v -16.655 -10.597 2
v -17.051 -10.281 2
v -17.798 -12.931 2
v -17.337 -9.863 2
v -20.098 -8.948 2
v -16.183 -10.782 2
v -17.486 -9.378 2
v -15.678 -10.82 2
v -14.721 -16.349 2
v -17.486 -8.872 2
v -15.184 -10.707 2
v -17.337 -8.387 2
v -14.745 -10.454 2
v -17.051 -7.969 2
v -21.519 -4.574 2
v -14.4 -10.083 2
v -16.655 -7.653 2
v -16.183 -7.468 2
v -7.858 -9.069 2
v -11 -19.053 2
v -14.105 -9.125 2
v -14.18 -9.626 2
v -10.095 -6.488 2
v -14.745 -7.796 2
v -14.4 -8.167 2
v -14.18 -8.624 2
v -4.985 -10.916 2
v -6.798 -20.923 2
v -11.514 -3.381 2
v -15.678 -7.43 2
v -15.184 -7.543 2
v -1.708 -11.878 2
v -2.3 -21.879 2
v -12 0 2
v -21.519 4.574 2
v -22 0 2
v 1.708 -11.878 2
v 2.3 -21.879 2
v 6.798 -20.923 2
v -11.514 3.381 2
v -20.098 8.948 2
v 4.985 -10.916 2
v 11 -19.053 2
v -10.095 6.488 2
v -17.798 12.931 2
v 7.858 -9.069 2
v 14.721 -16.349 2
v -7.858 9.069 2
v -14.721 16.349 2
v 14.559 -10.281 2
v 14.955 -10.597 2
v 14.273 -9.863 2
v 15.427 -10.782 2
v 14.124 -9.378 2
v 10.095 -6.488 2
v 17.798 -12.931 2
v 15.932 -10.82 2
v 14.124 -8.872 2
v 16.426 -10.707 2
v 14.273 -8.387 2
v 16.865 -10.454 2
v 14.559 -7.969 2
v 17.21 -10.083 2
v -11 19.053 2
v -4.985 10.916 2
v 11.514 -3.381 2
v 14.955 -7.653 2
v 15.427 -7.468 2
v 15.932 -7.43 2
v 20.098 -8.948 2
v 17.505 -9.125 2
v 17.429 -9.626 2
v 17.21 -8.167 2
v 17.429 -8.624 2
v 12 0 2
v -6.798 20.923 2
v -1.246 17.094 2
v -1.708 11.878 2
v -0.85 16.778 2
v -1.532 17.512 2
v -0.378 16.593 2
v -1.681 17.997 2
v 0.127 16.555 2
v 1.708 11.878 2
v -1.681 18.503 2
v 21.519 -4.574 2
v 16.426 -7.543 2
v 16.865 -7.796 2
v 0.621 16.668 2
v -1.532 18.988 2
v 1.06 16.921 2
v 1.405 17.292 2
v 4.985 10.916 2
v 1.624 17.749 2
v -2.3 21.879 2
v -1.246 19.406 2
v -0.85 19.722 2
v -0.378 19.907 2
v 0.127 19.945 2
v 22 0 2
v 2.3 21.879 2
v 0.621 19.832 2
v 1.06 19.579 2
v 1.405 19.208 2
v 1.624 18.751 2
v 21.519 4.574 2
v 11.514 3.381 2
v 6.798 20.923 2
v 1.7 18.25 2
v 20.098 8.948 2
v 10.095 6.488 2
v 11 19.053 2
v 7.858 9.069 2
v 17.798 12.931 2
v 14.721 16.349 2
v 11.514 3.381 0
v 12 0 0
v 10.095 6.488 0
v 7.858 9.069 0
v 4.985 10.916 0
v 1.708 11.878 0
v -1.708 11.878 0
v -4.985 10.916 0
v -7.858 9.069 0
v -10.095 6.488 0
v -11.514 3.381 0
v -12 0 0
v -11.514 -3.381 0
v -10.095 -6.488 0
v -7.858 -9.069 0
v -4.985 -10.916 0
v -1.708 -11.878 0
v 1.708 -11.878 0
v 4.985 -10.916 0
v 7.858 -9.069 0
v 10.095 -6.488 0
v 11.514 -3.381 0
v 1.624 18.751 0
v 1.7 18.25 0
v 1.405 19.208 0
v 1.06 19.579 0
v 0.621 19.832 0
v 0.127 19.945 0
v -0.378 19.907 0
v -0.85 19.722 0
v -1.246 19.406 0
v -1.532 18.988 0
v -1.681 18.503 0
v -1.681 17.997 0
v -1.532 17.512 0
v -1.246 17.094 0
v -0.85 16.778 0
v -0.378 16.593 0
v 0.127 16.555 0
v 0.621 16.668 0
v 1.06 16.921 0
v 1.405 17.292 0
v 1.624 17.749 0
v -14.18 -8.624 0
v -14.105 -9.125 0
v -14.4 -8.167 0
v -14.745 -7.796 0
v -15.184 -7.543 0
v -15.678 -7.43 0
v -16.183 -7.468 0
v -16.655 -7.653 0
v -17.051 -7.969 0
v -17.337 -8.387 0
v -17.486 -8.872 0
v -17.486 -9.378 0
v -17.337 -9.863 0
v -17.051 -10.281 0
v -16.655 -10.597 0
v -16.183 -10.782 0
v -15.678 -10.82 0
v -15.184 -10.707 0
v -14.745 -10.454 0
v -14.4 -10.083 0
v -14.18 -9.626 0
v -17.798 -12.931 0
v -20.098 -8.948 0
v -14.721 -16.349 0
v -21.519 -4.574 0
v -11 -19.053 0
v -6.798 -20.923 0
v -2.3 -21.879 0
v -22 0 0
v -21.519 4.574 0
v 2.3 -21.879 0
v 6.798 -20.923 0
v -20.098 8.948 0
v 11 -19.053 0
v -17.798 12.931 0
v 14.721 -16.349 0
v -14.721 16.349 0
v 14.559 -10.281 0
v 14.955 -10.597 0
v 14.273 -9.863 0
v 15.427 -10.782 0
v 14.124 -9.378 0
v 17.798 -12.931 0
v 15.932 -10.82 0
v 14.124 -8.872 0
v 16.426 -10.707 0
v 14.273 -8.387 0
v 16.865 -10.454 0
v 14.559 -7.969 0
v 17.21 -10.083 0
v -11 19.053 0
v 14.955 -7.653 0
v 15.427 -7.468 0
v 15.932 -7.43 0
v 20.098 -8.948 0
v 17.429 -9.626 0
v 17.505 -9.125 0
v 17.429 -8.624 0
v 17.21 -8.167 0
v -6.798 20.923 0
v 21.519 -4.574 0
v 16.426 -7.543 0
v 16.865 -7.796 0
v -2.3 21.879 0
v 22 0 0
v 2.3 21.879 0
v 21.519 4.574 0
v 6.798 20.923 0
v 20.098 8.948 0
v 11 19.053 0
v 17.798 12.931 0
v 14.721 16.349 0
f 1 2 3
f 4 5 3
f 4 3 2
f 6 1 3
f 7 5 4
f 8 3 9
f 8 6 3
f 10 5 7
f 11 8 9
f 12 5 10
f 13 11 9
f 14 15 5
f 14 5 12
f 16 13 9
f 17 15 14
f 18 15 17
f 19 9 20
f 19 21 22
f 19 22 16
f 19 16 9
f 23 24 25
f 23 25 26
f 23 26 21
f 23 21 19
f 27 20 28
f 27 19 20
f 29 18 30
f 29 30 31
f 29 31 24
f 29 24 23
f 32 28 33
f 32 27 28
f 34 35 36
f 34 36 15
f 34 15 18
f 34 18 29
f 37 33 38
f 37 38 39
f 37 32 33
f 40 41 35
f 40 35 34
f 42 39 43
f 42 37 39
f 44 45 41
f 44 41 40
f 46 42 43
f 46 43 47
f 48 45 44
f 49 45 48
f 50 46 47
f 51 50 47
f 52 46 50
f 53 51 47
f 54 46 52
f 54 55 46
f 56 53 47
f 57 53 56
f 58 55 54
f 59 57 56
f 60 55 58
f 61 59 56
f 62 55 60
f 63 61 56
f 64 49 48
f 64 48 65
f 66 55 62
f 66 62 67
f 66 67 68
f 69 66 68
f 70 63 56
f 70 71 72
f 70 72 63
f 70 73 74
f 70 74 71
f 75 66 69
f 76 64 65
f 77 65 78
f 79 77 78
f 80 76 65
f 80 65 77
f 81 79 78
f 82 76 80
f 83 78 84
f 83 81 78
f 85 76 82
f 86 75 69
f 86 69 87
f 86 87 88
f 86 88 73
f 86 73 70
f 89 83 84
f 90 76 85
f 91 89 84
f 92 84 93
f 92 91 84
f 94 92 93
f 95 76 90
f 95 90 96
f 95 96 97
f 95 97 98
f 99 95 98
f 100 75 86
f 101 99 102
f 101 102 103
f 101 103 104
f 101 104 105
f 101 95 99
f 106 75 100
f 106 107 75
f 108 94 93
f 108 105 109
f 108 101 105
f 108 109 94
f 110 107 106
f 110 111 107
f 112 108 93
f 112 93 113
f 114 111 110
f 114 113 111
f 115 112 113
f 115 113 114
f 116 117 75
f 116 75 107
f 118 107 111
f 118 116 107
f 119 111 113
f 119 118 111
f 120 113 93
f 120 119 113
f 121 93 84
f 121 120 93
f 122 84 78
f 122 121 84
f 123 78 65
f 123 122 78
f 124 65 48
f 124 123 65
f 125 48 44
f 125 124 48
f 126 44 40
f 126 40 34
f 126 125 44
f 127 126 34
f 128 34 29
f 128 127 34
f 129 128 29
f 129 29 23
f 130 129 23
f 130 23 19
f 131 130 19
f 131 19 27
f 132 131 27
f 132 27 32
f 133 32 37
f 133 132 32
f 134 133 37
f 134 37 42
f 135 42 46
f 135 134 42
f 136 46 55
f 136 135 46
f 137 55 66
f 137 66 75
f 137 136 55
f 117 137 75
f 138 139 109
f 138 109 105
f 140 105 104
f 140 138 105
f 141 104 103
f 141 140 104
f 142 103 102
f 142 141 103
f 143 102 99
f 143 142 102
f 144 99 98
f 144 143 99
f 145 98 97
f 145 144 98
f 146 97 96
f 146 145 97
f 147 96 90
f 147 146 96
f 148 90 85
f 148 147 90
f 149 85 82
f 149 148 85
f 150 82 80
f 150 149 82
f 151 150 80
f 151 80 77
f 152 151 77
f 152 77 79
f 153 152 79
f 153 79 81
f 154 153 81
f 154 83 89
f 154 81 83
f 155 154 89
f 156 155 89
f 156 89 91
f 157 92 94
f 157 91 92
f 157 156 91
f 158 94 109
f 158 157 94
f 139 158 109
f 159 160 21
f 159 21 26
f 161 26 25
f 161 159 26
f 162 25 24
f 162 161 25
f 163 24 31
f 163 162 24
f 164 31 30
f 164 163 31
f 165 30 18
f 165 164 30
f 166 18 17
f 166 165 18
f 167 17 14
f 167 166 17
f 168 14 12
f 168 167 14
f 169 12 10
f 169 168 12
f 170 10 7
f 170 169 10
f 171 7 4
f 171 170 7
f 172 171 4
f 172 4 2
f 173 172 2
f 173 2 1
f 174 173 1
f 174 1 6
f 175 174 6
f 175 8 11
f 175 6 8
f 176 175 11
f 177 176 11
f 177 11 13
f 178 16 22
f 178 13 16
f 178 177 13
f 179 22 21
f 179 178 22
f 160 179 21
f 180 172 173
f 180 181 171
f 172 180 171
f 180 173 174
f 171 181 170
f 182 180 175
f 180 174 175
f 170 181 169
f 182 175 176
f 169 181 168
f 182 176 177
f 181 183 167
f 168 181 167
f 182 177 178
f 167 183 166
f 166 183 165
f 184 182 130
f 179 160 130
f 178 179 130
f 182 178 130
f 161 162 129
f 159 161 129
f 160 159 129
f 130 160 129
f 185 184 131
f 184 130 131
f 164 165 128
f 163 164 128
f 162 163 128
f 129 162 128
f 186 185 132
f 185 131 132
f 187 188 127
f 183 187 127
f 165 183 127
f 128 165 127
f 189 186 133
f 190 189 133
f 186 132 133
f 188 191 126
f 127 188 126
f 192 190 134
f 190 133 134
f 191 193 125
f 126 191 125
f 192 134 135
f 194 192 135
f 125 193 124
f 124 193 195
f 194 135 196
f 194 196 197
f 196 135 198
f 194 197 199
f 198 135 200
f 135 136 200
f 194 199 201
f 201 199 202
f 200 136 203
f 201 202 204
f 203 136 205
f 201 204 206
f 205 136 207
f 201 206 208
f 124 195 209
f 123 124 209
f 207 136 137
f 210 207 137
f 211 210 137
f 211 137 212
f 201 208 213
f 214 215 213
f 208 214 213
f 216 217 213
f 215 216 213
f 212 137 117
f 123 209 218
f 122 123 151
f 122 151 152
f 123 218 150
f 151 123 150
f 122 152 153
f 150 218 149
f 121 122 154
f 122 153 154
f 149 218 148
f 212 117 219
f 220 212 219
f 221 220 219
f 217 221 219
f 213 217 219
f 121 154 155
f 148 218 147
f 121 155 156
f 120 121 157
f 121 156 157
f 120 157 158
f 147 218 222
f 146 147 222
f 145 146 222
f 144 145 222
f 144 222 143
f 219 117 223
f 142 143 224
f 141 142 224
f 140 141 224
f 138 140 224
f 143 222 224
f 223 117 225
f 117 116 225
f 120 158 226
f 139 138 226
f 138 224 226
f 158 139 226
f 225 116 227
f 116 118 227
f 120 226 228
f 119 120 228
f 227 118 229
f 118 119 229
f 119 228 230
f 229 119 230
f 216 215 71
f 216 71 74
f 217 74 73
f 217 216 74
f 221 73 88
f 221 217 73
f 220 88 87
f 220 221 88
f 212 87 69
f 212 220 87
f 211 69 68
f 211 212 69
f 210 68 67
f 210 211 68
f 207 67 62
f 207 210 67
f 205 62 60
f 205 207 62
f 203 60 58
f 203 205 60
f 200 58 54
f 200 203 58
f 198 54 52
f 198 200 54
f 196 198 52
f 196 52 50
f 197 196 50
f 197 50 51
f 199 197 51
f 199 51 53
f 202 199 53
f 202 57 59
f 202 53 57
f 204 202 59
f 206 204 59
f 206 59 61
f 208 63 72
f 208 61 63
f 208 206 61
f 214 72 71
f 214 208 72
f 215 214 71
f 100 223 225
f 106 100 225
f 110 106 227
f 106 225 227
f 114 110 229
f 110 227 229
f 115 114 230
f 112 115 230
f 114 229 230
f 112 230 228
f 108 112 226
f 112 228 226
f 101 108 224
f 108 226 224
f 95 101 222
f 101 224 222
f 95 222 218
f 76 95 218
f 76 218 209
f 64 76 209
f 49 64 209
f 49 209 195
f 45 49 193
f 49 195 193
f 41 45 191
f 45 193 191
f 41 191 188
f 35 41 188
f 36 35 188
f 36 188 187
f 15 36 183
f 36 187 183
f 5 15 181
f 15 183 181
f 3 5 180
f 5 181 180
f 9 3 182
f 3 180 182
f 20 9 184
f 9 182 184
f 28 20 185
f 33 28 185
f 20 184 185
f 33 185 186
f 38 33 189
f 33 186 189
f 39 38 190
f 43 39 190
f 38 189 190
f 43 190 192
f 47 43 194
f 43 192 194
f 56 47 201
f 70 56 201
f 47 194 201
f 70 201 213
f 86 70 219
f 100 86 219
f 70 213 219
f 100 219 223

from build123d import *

# Parameters (mm, degrees)
S01_OUTER_RACE_RETAINING_LIP_R          = 22
S01_OUTER_RACE_RETAINING_LIP_R_2        = 12
F_01_OUTER_RACE_RETAINING_LIP_DEPTH     = 2
F_02_START                              = -1
S02_THREE_ACCESSIBLE_SCREW_HOLES_R      = 1.7
F_02_THREE_ACCESSIBLE_SCREW_HOLES_DEPTH = 4


with BuildPart() as part:
    # S01 - Outer race retaining lip → 01 - Outer race retaining lip (new body)
    with BuildSketch(Plane.XY):
        Circle(S01_OUTER_RACE_RETAINING_LIP_R)
        Circle(S01_OUTER_RACE_RETAINING_LIP_R_2, mode=Mode.SUBTRACT)
    extrude(amount=F_01_OUTER_RACE_RETAINING_LIP_DEPTH)

    # S02 - Three accessible screw holes → 02 - Three accessible screw holes (cut)
    with BuildSketch(Plane.XY.offset(F_02_START)):
        with Locations((0, 18.25)):
            Circle(S02_THREE_ACCESSIBLE_SCREW_HOLES_R)
        with Locations((-15.804963619, -9.125)):
            Circle(S02_THREE_ACCESSIBLE_SCREW_HOLES_R)
        with Locations((15.804963619, -9.125)):
            Circle(S02_THREE_ACCESSIBLE_SCREW_HOLES_R)
    extrude(amount=F_02_THREE_ACCESSIBLE_SCREW_HOLES_DEPTH, mode=Mode.SUBTRACT)


solid = part.part
